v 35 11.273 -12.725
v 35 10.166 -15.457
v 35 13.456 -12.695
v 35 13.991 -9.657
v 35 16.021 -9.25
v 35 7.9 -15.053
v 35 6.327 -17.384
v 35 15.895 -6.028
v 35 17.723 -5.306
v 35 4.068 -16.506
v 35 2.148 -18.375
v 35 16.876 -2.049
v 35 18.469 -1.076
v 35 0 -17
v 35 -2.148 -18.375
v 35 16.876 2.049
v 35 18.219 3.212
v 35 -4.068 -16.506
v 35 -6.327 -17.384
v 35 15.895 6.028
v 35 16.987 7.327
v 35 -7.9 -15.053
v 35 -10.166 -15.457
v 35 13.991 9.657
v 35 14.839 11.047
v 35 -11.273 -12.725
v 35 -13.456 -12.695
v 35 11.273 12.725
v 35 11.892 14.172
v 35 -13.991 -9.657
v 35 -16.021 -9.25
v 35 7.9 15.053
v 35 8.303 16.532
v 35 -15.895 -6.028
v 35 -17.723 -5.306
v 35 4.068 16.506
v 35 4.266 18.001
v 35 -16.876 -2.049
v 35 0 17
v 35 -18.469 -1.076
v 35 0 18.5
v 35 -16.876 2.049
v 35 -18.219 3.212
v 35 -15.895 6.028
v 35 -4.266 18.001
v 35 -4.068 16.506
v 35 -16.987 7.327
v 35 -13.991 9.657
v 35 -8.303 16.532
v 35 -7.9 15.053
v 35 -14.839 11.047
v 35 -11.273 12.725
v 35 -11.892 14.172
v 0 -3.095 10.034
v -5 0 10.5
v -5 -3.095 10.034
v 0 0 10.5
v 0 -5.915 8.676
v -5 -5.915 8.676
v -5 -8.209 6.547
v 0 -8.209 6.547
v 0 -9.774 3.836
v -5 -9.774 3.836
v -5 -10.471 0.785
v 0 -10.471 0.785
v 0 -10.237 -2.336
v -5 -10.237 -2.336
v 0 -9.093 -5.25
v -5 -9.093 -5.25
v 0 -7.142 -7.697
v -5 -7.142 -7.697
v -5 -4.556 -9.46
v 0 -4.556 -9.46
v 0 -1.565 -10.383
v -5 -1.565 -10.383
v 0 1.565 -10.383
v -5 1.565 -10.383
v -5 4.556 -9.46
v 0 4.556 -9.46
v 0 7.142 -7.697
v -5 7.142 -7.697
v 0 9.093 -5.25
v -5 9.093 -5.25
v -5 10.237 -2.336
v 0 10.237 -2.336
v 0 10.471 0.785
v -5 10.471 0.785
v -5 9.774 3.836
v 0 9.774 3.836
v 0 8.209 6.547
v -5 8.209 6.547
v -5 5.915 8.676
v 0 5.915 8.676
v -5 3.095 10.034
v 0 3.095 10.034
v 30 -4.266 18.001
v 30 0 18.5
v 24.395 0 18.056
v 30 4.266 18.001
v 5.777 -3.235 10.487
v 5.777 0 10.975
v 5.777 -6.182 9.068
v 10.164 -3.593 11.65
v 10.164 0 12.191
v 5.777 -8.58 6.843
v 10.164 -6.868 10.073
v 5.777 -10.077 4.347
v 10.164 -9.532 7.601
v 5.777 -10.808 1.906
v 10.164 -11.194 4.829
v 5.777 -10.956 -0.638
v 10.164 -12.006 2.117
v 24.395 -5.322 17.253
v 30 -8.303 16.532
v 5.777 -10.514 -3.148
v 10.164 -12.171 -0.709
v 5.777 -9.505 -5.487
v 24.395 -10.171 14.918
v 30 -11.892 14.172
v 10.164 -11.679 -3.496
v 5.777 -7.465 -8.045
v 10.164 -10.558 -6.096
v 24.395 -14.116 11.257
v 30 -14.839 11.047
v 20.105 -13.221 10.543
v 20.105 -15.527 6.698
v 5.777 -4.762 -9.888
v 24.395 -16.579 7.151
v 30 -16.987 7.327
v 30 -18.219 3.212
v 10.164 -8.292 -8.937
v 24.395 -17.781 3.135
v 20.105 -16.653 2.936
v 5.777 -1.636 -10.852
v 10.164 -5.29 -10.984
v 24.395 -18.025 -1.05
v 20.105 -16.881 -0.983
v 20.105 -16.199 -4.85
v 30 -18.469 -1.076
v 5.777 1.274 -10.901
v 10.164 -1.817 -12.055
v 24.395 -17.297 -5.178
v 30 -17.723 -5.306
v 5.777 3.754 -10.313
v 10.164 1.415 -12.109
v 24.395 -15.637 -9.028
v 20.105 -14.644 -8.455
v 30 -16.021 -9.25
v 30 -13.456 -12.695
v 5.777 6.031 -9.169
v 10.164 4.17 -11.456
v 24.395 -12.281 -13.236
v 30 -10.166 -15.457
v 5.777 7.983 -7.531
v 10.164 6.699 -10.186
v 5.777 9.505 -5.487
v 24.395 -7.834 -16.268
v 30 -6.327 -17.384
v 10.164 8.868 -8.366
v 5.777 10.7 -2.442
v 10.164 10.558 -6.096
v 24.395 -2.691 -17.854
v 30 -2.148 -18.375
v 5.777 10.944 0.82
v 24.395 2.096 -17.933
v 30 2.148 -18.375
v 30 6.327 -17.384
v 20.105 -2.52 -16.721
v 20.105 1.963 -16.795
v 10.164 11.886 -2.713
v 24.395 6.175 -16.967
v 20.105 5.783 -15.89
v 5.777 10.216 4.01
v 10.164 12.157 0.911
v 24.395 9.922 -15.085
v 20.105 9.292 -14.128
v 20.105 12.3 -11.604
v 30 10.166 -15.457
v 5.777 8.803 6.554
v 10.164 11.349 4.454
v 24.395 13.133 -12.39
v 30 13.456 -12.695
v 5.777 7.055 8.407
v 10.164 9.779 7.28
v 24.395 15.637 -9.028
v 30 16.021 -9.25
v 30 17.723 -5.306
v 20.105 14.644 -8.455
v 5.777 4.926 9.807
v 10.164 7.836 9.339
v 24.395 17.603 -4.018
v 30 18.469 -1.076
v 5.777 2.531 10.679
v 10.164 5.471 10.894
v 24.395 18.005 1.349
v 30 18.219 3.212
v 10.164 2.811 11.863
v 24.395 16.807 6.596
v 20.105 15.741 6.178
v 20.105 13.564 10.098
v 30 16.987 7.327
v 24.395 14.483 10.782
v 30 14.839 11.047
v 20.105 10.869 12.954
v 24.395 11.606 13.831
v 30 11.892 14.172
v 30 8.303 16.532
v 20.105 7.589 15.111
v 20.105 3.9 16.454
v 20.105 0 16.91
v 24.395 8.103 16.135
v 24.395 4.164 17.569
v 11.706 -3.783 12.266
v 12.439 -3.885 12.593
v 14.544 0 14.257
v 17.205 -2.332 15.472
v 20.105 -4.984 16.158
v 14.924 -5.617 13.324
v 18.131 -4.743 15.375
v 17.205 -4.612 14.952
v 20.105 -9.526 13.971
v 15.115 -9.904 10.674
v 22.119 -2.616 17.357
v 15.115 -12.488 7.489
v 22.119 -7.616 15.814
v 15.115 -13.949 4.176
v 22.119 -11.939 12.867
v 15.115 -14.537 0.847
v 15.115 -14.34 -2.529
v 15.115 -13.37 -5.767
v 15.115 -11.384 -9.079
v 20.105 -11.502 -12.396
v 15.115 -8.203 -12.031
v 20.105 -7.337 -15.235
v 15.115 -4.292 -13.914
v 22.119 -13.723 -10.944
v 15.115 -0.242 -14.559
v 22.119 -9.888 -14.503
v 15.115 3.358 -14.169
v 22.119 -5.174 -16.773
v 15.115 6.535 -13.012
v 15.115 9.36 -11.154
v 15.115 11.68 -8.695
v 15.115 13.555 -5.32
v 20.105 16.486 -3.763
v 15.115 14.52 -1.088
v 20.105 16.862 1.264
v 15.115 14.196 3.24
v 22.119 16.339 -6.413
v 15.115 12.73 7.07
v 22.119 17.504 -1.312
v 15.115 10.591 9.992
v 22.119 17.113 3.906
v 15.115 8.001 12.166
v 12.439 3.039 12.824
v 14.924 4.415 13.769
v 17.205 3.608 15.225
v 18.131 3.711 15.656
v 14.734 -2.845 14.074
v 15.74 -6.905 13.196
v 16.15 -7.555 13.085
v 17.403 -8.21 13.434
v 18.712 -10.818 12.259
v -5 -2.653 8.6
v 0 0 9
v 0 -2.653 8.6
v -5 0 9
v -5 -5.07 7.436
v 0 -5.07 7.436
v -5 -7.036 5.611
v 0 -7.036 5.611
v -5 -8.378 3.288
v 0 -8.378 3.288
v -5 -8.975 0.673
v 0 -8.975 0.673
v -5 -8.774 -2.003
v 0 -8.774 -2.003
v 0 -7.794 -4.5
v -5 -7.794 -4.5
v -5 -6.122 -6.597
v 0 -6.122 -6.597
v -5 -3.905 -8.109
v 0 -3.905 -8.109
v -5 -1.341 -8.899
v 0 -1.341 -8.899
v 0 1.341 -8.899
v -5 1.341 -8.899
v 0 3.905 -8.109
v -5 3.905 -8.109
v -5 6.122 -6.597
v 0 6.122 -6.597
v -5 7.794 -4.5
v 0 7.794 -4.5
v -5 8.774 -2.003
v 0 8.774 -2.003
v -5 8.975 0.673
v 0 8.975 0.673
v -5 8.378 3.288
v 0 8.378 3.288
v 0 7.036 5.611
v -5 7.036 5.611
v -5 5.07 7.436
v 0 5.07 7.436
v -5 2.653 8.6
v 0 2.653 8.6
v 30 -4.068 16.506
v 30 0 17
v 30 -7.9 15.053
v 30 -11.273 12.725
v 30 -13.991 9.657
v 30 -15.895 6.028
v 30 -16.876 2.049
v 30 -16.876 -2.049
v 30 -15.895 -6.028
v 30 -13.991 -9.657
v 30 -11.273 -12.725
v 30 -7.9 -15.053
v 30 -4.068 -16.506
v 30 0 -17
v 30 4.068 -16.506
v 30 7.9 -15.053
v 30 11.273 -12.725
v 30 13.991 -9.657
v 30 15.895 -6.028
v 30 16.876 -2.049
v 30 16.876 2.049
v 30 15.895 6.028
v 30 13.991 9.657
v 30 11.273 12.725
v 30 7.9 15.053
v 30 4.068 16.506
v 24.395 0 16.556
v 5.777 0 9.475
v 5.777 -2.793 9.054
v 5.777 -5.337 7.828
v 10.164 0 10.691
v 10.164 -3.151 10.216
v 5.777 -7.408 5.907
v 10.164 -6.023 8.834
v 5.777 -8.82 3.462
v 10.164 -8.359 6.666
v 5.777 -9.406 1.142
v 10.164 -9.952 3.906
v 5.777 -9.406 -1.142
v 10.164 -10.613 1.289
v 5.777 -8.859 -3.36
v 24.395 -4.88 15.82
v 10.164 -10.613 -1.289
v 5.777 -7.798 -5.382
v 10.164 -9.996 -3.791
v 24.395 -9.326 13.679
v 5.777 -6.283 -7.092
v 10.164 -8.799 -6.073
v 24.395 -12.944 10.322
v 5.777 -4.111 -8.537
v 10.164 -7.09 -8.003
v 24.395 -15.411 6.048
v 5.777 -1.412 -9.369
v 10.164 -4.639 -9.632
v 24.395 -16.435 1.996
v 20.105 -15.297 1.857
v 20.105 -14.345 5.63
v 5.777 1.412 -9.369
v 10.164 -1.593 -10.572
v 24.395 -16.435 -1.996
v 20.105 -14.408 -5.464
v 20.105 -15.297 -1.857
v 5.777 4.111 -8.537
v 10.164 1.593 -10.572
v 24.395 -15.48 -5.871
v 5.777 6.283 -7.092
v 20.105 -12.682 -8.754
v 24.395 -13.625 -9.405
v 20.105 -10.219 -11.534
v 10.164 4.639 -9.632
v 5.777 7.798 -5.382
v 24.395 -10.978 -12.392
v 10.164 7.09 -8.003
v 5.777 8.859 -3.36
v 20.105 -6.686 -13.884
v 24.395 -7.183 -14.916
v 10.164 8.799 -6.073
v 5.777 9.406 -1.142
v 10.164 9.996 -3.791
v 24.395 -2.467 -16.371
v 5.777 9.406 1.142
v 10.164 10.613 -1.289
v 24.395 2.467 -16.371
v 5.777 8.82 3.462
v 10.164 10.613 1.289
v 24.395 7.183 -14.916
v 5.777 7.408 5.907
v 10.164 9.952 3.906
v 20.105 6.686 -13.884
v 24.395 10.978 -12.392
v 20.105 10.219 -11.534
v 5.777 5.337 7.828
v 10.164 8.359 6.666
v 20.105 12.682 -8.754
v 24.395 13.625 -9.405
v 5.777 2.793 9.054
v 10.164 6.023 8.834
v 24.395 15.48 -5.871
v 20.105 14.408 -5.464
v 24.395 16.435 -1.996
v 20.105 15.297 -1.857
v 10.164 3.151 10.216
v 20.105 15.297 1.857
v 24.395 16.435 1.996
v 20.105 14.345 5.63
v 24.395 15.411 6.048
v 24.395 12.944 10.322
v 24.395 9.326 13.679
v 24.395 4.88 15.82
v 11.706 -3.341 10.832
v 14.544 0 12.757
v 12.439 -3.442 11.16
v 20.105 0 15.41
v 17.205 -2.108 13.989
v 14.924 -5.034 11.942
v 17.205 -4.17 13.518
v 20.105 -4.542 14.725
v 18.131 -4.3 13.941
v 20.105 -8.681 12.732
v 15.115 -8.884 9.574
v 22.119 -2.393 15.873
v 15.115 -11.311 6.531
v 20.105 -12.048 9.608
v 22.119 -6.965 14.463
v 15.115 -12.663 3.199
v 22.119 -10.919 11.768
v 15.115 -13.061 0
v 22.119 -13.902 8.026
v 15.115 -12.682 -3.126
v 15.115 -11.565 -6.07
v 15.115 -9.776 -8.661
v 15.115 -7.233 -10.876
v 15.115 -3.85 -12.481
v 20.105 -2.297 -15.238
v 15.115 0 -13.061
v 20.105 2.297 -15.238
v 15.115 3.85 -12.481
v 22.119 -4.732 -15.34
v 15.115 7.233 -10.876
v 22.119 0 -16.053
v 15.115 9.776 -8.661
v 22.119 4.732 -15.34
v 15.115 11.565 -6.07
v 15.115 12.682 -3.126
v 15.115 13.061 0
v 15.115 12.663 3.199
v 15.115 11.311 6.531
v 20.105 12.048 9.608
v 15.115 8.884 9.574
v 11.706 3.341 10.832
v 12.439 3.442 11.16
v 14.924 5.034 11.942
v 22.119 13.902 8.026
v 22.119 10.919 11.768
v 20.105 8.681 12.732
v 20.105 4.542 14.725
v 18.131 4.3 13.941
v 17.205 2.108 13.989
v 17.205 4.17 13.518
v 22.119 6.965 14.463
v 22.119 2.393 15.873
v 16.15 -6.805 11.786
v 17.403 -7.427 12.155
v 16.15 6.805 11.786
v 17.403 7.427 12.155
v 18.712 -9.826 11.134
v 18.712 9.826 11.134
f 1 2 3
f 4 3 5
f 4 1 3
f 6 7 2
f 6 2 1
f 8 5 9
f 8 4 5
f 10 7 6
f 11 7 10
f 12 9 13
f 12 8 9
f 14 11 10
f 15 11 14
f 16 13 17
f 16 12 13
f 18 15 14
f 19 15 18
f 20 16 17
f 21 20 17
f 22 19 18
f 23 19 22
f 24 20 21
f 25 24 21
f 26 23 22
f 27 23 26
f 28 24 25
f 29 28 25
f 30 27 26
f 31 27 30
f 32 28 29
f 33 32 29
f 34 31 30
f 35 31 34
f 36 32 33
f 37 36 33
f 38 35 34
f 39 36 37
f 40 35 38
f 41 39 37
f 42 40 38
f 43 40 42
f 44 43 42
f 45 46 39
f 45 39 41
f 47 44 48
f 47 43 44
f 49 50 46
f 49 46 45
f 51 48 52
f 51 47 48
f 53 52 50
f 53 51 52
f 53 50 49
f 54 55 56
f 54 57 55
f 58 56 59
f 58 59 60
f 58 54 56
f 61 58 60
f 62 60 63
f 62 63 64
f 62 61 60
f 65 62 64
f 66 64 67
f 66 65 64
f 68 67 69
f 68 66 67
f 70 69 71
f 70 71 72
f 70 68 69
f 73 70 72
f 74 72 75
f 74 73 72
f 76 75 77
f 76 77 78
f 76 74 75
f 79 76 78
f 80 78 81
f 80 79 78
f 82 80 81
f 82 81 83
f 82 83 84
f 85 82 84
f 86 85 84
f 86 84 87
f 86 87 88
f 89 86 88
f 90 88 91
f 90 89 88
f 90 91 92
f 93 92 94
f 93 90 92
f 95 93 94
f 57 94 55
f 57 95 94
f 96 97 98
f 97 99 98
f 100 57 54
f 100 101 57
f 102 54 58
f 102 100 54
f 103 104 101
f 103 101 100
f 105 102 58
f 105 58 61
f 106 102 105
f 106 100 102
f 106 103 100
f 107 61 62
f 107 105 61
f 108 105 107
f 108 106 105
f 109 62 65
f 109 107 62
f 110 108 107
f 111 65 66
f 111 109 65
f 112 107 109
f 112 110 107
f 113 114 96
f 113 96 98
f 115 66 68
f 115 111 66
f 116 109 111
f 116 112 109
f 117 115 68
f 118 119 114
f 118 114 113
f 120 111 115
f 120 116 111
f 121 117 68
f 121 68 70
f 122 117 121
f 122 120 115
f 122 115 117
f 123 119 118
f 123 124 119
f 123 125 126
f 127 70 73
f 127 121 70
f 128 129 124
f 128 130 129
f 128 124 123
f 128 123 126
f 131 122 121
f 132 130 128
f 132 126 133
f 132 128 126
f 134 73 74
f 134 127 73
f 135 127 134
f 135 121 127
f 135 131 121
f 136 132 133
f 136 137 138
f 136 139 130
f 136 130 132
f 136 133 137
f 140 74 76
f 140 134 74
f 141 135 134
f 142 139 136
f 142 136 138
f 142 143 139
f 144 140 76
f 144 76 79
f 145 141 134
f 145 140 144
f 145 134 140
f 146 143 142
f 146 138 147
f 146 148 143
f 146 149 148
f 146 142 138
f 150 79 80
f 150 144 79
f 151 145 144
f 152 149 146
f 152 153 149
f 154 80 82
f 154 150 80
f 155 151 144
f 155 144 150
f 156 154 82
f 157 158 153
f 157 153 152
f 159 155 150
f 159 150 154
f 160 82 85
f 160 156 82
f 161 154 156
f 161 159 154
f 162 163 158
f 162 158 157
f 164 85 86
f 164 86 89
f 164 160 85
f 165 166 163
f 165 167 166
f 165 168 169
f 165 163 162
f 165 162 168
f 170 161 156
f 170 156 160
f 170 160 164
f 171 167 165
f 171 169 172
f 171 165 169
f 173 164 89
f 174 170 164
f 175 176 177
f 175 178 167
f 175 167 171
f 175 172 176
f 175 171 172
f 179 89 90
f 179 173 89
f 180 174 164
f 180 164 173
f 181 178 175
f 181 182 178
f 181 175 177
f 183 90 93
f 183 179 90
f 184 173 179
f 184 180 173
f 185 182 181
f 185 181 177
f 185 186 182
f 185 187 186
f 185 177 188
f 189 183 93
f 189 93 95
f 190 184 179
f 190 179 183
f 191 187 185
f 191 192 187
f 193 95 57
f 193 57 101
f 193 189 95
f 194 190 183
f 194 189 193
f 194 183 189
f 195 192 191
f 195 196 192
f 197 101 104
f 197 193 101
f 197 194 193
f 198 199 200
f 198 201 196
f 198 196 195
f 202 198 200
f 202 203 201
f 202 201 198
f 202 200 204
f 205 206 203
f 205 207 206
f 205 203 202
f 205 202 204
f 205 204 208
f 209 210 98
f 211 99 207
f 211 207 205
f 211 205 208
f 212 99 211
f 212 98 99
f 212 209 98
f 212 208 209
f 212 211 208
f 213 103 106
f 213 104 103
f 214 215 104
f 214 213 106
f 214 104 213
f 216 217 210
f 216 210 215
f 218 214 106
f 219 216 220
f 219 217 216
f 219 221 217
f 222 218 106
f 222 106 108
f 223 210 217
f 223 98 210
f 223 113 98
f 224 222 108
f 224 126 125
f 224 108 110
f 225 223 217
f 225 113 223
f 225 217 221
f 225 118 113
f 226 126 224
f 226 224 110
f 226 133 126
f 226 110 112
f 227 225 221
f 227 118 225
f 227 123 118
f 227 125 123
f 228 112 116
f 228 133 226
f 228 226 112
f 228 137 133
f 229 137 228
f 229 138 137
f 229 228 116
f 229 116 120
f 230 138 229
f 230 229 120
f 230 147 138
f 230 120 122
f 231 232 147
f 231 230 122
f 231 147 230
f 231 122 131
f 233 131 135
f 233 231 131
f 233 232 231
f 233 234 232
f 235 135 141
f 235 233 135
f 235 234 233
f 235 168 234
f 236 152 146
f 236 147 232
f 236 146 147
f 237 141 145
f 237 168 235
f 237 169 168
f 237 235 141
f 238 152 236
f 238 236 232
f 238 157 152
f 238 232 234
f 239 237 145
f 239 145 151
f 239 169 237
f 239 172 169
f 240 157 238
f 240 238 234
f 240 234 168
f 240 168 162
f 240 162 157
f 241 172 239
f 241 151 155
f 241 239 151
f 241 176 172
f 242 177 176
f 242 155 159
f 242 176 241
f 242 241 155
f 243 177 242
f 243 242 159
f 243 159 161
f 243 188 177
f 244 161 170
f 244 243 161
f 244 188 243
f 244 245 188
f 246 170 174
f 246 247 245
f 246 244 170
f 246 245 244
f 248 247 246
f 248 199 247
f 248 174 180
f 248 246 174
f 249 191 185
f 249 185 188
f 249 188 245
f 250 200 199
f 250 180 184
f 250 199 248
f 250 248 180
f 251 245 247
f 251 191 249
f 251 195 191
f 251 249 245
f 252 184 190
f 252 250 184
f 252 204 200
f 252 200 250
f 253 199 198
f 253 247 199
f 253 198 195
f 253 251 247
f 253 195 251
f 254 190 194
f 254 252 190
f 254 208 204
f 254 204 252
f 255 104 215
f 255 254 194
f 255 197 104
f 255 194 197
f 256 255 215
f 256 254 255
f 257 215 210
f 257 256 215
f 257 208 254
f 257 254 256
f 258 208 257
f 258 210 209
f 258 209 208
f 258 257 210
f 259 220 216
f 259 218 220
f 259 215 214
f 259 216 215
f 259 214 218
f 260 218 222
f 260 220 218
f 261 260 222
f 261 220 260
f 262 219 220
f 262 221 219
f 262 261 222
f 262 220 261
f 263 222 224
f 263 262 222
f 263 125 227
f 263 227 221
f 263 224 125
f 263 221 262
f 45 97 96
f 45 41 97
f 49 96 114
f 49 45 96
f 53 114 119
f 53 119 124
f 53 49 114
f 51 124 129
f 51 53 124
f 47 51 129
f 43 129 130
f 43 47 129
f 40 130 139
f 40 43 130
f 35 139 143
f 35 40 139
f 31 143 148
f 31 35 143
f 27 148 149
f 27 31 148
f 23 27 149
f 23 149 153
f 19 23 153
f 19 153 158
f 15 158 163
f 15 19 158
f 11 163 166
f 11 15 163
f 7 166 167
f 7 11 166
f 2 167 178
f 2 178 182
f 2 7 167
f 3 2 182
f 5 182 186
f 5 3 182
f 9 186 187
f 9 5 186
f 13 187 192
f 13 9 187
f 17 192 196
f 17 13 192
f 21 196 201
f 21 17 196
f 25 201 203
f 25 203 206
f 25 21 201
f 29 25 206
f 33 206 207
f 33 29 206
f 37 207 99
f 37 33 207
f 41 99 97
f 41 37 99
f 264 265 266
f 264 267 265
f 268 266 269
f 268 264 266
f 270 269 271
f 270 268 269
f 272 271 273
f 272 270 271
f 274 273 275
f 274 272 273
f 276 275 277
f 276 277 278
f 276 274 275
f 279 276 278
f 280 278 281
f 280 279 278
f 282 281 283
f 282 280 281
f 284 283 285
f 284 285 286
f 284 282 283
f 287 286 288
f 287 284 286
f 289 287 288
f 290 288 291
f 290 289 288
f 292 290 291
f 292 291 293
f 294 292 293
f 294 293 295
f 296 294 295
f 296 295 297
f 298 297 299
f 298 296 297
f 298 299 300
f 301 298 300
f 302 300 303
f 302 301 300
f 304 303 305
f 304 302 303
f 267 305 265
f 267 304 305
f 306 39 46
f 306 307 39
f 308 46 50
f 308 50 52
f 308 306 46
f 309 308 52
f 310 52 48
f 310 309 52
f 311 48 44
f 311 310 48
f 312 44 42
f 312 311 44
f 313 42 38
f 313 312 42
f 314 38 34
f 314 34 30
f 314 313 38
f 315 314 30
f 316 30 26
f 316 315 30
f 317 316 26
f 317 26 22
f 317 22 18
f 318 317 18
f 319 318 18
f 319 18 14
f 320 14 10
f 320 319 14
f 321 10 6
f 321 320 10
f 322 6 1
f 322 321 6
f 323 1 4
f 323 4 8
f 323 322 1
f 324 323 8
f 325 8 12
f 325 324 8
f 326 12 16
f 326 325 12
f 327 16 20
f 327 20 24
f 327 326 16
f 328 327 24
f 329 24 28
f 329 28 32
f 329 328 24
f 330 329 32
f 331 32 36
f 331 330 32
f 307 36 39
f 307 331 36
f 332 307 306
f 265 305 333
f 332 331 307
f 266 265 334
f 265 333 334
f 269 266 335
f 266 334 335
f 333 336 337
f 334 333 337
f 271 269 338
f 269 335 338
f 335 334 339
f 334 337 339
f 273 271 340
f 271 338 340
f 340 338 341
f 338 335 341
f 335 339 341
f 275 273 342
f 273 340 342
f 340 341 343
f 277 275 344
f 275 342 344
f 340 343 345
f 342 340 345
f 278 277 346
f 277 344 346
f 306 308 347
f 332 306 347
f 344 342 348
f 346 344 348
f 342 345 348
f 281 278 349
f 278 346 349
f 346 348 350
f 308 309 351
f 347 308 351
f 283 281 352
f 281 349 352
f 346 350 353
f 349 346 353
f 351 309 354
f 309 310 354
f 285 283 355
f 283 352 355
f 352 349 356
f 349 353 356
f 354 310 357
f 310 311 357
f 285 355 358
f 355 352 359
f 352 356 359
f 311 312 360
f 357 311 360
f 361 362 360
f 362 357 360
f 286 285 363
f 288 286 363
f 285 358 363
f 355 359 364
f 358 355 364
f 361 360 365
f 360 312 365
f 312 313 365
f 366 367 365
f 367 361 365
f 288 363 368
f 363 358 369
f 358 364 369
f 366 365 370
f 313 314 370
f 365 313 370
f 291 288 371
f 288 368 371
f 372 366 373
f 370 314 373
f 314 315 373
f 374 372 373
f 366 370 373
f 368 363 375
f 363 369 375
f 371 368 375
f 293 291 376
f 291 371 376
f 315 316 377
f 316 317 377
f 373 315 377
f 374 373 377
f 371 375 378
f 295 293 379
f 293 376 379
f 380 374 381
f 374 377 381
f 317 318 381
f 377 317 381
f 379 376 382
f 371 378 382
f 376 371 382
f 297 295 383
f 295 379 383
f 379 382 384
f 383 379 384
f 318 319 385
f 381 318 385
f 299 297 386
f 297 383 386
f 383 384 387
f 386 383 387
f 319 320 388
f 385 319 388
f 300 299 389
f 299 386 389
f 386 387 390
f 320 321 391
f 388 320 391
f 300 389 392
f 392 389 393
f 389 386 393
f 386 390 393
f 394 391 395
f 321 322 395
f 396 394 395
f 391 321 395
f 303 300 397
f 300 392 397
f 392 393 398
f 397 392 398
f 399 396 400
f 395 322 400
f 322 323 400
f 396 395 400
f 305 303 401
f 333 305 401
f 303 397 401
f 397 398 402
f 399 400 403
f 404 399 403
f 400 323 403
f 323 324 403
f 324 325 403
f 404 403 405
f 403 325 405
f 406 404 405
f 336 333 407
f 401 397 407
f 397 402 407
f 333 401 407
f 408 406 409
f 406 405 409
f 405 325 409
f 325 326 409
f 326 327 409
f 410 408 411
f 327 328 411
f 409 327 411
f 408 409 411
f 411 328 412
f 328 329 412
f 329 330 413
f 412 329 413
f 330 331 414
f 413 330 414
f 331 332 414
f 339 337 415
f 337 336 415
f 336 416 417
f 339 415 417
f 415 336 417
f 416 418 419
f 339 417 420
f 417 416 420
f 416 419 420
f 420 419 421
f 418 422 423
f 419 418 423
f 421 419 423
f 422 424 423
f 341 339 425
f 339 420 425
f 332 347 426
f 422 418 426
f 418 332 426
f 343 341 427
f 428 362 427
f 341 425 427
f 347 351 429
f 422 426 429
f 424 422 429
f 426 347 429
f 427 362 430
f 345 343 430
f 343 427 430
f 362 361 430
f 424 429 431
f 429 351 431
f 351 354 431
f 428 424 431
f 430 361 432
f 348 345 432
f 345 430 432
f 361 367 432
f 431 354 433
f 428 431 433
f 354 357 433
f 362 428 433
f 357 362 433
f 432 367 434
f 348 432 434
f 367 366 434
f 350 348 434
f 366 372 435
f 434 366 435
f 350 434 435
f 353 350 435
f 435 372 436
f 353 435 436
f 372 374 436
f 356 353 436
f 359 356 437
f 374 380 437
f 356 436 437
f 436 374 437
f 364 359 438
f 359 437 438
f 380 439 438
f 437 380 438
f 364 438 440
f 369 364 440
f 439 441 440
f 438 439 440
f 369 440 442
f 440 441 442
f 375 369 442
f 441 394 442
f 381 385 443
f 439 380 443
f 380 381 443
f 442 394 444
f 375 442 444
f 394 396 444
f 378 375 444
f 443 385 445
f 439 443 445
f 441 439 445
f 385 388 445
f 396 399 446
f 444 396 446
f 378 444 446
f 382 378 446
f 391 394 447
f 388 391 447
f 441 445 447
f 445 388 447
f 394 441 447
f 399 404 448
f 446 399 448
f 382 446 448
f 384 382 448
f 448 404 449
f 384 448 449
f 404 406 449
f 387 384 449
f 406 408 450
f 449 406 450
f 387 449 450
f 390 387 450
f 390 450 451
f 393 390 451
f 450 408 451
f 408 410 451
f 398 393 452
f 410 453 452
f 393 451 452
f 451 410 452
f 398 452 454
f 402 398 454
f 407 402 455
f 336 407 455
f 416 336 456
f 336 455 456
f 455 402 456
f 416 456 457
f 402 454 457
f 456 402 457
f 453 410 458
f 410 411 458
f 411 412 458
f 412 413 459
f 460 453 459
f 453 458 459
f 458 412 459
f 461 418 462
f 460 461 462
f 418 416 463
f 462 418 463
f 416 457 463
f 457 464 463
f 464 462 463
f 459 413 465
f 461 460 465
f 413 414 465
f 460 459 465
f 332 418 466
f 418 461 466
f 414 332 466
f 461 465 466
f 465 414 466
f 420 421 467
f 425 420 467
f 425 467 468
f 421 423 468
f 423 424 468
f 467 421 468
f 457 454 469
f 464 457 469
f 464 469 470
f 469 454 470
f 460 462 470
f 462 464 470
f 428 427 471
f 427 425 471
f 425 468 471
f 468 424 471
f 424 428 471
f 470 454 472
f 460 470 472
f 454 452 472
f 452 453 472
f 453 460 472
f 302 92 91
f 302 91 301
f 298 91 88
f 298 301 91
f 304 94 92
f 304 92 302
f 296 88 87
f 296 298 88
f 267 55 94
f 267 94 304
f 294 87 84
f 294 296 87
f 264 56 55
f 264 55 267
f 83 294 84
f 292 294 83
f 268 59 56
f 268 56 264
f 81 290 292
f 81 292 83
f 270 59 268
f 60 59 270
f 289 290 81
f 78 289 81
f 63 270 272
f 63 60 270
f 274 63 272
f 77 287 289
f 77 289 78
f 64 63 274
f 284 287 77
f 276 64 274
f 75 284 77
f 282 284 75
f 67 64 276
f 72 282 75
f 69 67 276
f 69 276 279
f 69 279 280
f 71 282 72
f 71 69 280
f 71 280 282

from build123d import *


with BuildPart() as part:
    # Sketch1 → Revolve1 (revolve)
    with BuildSketch(Plane(origin=(0, 0, 0), x_dir=(1, 0, 0), z_dir=(0, 1, 0)), mode=Mode.PRIVATE) as revolve1_sk:
        with BuildLine():
            Line((0, 9), (-5, 9))
            Line((-5, 9), (-5, 10.5))
            Line((-5, 10.5), (0, 10.5))
            add(Edge.make_bspline(
                [(0, 10.5), (15, 10.5), (15, 18.5), (30, 18.5)],
                knots=[0, 0, 0, 0, 1, 1, 1, 1], degree=3))
            Line((30, 18.5), (35, 18.5))
            Line((35, 18.5), (35, 17))
            Line((35, 17), (30, 17))
            add(Edge.make_bspline(
                [(0, 9), (15, 9), (15, 17), (30, 17)],
                knots=[0, 0, 0, 0, 1, 1, 1, 1], degree=3))
        make_face()
    revolve(revolve1_sk.sketch.rotate(Axis((0, 0, 0), (1, 0, 0)), 180), axis=Axis((0, 0, 0), (1, 0, 0)))


solid = part.part
